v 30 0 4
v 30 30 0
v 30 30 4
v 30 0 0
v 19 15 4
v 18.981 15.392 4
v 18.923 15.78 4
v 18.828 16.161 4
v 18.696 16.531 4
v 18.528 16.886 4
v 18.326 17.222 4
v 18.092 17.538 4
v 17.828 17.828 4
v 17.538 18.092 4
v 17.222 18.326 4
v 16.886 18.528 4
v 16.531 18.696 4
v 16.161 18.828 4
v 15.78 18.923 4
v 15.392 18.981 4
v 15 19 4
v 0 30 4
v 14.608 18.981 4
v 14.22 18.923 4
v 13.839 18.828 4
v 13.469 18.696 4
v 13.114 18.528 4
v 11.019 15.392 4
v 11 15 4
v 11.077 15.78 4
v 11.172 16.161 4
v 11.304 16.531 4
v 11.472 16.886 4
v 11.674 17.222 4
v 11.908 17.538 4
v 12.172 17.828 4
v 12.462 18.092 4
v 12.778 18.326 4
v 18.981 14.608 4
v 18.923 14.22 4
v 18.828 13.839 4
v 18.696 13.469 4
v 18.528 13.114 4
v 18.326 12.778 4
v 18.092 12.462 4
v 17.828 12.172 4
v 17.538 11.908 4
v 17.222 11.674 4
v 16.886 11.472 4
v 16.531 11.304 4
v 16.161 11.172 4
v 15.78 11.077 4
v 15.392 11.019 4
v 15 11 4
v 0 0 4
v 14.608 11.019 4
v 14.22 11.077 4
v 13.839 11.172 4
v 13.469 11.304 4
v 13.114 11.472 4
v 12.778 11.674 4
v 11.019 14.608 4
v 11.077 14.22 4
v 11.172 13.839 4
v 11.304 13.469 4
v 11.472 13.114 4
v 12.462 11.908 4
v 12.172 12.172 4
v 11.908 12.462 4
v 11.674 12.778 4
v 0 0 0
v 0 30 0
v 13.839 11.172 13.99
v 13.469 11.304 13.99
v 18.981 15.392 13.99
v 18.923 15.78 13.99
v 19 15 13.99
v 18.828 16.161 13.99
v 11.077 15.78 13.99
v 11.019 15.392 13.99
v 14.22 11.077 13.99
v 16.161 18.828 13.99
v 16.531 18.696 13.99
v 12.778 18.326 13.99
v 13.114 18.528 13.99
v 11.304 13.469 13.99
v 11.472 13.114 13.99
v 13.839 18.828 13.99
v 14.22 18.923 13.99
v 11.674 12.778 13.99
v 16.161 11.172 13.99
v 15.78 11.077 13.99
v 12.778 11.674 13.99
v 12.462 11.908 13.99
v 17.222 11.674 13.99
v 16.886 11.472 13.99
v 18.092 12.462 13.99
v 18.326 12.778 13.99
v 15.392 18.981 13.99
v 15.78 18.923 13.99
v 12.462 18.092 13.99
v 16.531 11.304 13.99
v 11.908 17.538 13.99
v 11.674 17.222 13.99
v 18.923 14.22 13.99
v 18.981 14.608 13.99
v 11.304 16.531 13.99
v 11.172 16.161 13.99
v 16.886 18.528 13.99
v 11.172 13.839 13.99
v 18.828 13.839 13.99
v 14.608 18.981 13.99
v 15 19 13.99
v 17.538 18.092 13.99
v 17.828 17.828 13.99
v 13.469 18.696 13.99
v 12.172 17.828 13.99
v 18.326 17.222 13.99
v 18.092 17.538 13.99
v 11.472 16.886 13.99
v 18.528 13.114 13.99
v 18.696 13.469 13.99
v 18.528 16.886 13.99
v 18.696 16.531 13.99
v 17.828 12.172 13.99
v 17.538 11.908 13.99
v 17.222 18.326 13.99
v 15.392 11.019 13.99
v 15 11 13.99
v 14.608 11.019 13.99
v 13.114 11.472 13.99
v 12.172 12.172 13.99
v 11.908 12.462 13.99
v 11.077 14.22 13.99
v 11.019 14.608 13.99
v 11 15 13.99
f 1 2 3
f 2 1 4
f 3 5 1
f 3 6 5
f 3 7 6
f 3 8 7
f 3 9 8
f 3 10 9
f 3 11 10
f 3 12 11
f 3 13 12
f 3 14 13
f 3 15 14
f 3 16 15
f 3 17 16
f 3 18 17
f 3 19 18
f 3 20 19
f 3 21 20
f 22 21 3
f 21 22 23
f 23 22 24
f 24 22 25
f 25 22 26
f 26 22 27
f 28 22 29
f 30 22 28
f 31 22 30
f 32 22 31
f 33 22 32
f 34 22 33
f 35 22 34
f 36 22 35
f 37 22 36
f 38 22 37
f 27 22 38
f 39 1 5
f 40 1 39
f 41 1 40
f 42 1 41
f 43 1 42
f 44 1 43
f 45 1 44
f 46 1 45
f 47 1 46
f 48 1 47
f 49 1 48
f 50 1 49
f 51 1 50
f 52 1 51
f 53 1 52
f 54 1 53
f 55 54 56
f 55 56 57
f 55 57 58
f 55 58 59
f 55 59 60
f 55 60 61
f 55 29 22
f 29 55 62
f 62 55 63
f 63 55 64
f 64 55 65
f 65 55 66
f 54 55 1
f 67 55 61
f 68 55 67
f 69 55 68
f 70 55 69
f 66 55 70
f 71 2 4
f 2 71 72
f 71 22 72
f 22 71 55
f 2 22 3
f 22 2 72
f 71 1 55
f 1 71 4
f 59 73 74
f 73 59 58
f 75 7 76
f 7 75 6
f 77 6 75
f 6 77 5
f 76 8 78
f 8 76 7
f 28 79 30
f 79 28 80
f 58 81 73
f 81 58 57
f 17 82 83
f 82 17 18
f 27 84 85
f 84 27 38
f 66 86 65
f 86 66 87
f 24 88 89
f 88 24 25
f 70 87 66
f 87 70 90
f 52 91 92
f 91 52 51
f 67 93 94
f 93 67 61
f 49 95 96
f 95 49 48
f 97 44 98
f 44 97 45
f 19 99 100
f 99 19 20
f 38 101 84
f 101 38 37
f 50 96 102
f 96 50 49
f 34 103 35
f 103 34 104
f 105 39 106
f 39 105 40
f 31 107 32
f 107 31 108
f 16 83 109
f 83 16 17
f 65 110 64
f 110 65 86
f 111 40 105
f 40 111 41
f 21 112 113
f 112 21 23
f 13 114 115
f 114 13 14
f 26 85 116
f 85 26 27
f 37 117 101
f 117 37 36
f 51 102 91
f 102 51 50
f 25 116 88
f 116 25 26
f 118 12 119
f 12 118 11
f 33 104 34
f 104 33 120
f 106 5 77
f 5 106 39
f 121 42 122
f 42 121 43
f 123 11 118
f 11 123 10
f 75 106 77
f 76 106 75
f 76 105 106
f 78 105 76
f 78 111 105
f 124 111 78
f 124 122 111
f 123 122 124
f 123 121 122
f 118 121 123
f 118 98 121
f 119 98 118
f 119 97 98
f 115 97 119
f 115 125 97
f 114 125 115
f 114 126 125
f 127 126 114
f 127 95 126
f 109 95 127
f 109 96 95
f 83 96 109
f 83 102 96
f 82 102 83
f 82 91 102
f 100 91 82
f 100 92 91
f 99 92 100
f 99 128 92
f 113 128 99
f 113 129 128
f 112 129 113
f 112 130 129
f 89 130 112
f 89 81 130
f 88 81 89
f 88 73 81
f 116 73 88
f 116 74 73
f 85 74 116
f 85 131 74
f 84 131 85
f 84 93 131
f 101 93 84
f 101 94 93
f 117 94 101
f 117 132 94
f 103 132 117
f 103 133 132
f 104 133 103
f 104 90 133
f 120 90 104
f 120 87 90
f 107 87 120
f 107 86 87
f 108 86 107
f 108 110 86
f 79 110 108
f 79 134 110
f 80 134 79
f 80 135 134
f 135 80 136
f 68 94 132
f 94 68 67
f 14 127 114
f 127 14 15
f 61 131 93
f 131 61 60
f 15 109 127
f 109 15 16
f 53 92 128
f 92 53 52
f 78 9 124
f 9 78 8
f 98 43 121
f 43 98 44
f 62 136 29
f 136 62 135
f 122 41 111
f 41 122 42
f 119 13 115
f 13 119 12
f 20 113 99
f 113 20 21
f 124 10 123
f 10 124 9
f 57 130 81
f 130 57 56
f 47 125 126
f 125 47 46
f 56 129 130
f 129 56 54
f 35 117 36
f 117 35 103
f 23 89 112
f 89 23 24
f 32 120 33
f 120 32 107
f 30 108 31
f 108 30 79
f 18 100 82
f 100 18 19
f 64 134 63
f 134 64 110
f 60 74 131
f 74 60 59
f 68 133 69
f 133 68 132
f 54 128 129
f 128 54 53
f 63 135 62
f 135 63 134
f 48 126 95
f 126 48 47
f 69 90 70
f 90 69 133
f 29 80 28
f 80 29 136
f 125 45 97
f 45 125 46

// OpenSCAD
// scad lane: 30x30x4 plate with a 8 mm peg and 3 mm chamfer-free slot; tests Manifold backend
$fn = 64;
union() {
  cube([30, 30, 4]);
  translate([15, 15, 3.99]) cylinder(d = 8, h = 10);
}
